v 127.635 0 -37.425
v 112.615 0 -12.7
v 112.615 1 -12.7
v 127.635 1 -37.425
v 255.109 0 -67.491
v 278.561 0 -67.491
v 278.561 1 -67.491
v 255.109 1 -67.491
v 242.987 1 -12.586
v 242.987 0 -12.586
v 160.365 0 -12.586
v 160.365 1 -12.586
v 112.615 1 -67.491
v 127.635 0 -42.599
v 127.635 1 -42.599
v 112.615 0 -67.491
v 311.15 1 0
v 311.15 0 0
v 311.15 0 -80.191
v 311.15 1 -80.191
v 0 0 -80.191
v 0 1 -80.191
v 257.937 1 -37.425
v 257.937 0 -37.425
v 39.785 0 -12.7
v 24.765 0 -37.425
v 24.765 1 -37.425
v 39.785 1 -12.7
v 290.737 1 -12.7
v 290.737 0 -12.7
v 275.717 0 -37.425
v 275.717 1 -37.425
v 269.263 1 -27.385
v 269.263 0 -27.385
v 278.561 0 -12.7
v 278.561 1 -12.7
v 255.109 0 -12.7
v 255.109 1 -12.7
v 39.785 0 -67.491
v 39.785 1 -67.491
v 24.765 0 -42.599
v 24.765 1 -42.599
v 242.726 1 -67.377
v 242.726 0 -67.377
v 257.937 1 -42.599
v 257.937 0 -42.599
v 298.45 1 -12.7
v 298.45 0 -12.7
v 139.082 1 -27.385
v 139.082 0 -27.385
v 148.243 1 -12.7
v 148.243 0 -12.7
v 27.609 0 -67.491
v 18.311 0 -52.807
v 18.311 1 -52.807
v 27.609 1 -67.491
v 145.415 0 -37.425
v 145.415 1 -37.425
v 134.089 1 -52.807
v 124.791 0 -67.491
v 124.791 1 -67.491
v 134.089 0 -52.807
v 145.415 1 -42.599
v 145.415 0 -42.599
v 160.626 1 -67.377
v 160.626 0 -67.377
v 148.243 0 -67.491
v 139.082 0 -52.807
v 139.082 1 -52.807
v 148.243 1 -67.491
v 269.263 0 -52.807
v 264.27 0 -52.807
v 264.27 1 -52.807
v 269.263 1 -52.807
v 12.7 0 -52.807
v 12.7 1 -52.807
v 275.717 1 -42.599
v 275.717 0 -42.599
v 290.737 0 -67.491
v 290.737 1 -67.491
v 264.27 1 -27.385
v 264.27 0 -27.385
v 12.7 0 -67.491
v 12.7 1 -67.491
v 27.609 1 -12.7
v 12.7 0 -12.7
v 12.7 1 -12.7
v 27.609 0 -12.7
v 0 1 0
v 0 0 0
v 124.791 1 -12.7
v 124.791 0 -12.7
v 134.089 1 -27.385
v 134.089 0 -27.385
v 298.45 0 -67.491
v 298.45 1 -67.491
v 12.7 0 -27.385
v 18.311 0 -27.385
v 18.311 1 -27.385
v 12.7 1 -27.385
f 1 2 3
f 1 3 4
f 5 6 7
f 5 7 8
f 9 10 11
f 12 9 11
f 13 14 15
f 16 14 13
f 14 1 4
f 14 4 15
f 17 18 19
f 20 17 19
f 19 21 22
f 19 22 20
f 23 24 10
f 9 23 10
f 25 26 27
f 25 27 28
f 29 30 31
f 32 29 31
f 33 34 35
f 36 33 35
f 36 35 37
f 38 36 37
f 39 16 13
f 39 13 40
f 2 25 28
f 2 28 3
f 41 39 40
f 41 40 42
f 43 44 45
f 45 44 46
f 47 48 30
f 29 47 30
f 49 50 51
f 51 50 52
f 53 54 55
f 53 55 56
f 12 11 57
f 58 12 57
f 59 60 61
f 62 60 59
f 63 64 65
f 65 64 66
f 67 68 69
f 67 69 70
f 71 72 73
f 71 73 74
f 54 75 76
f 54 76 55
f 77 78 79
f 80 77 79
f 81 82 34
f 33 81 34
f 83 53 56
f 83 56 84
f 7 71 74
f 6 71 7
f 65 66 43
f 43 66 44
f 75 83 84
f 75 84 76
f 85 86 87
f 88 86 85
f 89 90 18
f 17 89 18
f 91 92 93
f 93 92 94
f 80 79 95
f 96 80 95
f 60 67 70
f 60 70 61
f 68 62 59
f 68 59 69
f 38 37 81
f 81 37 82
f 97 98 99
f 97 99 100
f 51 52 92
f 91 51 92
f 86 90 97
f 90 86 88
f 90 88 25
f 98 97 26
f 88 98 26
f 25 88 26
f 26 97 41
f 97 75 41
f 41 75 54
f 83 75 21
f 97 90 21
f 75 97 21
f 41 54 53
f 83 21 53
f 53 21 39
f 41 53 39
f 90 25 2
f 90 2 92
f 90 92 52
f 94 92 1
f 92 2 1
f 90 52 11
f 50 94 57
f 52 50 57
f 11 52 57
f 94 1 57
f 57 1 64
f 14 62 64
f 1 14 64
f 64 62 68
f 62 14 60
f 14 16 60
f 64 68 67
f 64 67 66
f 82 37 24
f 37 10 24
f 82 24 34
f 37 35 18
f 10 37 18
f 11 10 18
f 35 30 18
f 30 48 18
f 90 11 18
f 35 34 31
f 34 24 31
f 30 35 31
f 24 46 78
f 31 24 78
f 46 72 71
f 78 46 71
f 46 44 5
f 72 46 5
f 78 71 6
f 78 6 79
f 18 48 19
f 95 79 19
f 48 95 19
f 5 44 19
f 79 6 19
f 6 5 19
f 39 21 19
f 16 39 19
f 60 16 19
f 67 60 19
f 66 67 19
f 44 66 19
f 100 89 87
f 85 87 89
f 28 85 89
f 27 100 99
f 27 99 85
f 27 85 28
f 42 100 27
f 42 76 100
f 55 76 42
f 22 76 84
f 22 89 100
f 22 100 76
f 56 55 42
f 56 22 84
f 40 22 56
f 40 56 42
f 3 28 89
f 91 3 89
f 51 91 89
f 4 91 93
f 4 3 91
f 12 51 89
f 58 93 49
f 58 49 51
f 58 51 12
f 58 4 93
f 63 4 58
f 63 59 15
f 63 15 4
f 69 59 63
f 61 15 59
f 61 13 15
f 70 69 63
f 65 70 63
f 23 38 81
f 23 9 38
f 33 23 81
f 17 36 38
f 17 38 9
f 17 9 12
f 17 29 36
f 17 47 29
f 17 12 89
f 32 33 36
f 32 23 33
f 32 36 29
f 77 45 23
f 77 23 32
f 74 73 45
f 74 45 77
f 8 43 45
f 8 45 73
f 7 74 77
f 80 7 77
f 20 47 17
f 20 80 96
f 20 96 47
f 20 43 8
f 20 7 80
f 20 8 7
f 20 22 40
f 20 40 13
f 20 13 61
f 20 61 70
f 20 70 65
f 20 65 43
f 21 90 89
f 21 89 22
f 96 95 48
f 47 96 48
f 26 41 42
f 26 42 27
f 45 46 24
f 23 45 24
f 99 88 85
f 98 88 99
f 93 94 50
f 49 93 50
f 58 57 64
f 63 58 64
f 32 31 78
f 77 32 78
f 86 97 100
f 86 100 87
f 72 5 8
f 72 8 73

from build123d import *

# Parameters (mm, degrees)
SKETCH1_W           = 311.15
SKETCH1_H           = 80.191313252
BOSS_EXTRUDE1_DEPTH = 1


with BuildPart() as part:
    # Sketch1 → Boss-Extrude1 (new body)
    with BuildSketch(Plane(origin=(0, 0, 0), x_dir=(1, 0, 0), z_dir=(0, 1, 0))):
        with Locations((155.575, 40.095656626)):
            Rectangle(SKETCH1_W, SKETCH1_H)
        Polygon((12.7, 52.8066), (18.310796472, 52.8066), (27.609157985, 67.491313252), (12.7, 67.491313252), align=None, mode=Mode.SUBTRACT)
        Polygon((12.7, 12.7), (27.609157985, 12.7), (18.310796472, 27.384713252), (12.7, 27.384713252), align=None, mode=Mode.SUBTRACT)
        Polygon((39.78500573, 12.7), (112.61499427, 12.7), (127.635, 37.424696429), (127.635, 42.599313252), (112.61499427, 67.491313252), (39.78500573, 67.491313252), (24.765, 42.599313252), (24.765, 37.424696429), align=None, mode=Mode.SUBTRACT)
        Polygon((134.089203528, 27.384713252), (139.081919808, 27.384713252), (148.242867112, 12.7), (124.790842015, 12.7), align=None, mode=Mode.SUBTRACT)
        Polygon((124.790842015, 67.491313252), (134.089203528, 52.8066), (139.081919808, 52.8066), (148.242867112, 67.491313252), align=None, mode=Mode.SUBTRACT)
        Polygon((160.625882169, 67.376840045), (242.726117831, 67.376840045), (257.937, 42.599313252), (257.937, 37.424696429), (242.987396137, 12.586149763), (160.364603863, 12.586149763), (145.415, 37.424696429), (145.415, 42.599313252), align=None, mode=Mode.SUBTRACT)
        Polygon((255.109132888, 67.491313252), (264.270080192, 52.8066), (269.262796472, 52.8066), (278.561157985, 67.491313252), align=None, mode=Mode.SUBTRACT)
        Polygon((264.270080192, 27.384713252), (269.262796472, 27.384713252), (278.561157985, 12.7), (255.109132888, 12.7), align=None, mode=Mode.SUBTRACT)
        Polygon((298.45, 67.491313252), (298.45, 12.7), (290.73700573, 12.7), (275.717, 37.424696429), (275.717, 42.599313252), (290.73700573, 67.491313252), align=None, mode=Mode.SUBTRACT)
    extrude(amount=BOSS_EXTRUDE1_DEPTH)


solid = part.part
